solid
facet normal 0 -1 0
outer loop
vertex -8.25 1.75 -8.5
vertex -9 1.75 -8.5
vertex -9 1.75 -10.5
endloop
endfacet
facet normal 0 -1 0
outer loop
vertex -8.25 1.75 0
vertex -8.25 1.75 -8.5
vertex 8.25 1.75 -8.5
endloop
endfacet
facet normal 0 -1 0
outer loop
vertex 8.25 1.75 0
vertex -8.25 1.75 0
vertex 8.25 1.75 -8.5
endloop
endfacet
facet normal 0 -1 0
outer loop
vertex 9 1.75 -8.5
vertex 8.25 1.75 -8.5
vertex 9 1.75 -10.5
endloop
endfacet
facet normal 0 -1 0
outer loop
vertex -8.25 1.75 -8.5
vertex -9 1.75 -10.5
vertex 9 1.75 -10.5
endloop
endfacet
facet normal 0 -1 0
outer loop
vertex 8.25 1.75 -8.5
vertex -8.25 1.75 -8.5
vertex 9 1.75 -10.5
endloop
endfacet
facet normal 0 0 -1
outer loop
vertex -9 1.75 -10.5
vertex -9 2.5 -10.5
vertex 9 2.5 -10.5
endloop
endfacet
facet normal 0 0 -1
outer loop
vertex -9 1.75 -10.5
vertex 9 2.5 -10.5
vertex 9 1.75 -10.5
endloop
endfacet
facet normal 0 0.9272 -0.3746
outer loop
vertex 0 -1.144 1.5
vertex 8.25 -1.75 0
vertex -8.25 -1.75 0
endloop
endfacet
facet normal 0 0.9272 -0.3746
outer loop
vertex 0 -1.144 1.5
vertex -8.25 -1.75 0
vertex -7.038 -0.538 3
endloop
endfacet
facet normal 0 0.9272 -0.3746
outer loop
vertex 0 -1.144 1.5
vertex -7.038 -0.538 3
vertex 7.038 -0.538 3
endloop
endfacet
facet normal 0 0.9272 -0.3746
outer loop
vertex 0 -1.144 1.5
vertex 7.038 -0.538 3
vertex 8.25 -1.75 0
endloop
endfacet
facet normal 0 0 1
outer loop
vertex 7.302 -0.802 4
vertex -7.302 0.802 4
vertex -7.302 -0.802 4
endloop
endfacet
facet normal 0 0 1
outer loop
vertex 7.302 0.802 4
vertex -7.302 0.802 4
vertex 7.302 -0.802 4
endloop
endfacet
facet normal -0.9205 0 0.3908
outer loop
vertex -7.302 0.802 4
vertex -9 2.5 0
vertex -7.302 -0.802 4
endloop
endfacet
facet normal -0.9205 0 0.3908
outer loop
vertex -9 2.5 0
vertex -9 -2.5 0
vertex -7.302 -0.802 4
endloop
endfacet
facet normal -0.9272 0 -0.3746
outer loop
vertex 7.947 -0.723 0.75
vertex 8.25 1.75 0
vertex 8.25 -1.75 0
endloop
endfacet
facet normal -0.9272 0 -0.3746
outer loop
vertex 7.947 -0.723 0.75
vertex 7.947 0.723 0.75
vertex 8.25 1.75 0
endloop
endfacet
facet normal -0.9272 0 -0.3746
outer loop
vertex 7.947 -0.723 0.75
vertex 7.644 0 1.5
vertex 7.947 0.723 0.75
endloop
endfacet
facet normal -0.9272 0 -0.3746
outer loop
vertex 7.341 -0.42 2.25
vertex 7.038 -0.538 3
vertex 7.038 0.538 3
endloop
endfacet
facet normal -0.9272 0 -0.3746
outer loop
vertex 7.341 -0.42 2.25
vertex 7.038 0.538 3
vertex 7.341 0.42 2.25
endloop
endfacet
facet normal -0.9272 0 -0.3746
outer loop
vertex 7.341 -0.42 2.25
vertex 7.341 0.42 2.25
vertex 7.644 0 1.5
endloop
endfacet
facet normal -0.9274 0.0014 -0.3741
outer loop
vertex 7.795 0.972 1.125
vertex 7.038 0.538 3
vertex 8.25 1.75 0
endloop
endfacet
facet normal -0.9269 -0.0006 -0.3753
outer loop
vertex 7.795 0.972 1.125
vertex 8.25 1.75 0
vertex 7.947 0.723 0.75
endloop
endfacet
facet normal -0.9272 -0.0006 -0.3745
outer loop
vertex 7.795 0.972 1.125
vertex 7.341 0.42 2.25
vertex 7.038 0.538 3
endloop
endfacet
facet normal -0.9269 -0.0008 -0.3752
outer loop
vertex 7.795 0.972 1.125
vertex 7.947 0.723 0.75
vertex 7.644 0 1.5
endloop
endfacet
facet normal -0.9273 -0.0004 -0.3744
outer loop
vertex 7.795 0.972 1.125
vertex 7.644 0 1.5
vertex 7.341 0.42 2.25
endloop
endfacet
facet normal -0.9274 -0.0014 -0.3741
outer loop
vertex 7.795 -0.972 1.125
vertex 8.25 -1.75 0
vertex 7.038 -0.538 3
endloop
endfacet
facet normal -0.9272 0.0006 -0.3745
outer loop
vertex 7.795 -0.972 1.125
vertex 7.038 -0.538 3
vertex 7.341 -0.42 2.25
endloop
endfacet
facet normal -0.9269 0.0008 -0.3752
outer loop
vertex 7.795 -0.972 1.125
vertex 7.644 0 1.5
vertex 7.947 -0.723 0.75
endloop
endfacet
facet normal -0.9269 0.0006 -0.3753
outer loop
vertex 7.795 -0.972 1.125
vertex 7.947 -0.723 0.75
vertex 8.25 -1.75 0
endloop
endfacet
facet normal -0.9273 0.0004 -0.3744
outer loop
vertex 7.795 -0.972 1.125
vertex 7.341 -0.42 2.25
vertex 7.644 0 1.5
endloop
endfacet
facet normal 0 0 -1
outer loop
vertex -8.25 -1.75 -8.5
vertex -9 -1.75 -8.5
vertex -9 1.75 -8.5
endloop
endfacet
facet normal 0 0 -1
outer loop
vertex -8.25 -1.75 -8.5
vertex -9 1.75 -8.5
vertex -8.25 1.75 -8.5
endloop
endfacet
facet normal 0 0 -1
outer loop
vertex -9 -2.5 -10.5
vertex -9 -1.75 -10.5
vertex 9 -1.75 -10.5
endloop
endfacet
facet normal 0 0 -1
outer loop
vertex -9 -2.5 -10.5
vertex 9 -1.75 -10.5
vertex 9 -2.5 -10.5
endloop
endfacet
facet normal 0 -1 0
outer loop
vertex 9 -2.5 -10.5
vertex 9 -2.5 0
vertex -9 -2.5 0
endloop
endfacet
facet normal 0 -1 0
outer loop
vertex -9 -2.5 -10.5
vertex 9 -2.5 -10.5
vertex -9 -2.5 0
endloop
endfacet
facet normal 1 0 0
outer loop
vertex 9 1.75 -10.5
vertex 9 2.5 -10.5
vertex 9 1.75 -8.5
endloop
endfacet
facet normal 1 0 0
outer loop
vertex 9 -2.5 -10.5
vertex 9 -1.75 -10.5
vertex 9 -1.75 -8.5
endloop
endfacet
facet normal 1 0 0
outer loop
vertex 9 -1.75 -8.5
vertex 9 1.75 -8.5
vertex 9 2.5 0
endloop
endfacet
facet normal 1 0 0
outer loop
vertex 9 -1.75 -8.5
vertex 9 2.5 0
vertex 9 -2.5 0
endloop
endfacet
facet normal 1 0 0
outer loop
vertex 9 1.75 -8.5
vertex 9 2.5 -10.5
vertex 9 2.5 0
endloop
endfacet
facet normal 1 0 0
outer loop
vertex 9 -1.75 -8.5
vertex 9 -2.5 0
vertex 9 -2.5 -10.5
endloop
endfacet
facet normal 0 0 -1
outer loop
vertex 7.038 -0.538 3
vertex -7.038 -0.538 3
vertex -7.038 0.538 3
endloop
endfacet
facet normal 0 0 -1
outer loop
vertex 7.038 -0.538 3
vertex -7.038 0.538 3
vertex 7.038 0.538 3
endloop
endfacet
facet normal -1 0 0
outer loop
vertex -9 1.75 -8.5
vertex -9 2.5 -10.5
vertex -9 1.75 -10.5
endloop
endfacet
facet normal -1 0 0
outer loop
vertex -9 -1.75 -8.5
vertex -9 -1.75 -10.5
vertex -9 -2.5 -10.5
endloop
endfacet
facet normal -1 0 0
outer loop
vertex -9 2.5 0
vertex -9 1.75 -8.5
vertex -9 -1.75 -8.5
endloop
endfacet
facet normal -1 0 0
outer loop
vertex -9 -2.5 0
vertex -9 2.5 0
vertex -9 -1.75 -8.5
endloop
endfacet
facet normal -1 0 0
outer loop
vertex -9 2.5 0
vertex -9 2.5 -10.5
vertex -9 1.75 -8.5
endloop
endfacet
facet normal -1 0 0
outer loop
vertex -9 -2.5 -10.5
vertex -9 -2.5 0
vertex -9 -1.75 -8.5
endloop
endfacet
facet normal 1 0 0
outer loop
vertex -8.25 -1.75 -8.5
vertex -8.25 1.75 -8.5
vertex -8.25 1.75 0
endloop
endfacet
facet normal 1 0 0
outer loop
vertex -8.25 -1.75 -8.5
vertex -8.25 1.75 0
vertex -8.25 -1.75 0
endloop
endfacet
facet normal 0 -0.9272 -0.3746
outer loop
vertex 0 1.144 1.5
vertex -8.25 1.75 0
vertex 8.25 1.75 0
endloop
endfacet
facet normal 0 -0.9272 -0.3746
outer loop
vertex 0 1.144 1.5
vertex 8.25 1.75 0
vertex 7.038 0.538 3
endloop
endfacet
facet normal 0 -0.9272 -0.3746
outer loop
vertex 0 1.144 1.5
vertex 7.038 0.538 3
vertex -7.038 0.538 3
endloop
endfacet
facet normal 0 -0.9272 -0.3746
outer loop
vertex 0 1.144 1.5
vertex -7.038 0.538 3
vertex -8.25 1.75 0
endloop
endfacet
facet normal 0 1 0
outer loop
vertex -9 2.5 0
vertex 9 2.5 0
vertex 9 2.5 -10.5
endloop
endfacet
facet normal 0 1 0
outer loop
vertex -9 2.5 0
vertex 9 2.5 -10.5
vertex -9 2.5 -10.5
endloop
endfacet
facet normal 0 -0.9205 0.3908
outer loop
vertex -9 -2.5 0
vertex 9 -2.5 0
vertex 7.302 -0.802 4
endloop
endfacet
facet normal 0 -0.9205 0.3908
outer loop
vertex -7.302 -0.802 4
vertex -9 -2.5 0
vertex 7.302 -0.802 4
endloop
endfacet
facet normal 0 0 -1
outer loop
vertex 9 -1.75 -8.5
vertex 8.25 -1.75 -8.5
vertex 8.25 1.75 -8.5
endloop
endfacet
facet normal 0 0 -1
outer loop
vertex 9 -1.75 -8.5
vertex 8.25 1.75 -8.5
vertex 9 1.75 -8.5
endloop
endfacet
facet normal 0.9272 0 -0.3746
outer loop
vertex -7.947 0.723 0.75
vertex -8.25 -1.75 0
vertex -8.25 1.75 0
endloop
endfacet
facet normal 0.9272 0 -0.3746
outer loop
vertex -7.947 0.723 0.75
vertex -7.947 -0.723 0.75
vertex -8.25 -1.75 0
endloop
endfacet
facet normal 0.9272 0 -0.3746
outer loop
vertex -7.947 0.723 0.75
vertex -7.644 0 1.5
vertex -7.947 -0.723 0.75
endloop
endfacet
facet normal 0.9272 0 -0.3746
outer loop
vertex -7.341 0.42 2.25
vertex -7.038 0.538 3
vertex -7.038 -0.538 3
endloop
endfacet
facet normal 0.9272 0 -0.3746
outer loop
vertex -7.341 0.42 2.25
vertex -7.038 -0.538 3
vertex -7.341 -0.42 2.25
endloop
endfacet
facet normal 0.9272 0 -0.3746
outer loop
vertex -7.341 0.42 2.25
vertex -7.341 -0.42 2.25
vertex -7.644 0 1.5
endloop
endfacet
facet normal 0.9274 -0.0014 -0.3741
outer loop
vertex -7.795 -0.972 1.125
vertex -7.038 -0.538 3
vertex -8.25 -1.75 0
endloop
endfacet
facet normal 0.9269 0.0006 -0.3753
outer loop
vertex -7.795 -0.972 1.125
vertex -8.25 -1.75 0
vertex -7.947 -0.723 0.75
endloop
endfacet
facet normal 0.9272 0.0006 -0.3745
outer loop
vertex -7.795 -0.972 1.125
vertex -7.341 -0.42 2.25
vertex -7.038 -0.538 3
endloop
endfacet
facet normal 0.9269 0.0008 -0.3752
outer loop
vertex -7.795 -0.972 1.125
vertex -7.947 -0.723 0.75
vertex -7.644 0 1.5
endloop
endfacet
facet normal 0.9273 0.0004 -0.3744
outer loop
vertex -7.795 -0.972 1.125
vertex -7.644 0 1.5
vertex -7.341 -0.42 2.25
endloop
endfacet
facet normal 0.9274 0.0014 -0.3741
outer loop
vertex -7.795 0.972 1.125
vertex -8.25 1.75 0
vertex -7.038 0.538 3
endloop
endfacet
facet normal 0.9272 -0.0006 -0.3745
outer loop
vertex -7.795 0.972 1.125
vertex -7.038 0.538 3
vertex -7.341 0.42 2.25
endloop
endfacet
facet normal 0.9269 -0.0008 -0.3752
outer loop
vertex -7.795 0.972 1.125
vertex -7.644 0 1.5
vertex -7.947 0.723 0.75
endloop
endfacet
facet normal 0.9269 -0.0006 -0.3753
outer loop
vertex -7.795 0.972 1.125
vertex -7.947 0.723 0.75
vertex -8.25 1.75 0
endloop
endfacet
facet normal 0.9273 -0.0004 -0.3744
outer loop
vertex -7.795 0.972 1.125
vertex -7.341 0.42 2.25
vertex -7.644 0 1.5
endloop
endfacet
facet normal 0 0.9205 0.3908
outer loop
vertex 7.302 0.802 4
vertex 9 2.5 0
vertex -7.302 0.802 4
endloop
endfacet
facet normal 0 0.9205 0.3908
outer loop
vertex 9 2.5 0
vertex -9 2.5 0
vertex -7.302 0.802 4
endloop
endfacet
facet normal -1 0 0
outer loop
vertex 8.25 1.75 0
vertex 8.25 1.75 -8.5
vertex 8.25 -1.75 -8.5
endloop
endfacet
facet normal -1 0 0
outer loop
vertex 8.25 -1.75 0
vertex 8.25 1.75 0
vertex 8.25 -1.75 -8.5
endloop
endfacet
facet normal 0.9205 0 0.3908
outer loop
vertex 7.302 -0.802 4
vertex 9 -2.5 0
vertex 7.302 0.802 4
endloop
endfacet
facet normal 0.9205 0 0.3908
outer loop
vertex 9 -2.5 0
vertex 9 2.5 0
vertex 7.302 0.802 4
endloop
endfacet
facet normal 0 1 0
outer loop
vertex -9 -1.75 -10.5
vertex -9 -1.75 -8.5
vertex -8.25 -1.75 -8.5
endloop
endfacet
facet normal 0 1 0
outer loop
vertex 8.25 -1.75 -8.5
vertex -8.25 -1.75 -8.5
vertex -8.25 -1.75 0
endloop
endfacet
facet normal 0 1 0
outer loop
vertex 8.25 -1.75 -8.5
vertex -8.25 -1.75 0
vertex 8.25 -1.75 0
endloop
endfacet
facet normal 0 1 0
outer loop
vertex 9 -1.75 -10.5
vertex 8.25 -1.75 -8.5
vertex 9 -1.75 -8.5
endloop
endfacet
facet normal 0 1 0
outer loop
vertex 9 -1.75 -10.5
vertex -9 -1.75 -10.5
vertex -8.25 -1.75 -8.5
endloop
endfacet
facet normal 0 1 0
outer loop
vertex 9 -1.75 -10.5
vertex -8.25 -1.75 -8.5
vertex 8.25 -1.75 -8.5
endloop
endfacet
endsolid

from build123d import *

# Parameters (mm, degrees)
SKETCH_W        = 18
SKETCH_H        = 5
PAD_DEPTH       = 4
PAD_TAPER       = 23
PAD_FACE5_W     = 5
PAD_FACE5_H     = 18
PAD001_DEPTH    = 10.5
SKETCH001_W     = 16.5
SKETCH001_H     = 3.5
POCKET_DEPTH    = 10.5
SKETCH002_W     = 16.5
SKETCH002_H     = 3.5
POCKET001_DEPTH = 3
POCKET001_TAPER = 22
SKETCH003_W     = 18.711727
SKETCH003_H     = 3.5
POCKET002_DEPTH = 2


with BuildPart() as part:
    # Sketch → Pad (new body)
    with BuildSketch(Plane.XY):
        Rectangle(SKETCH_W, SKETCH_H)
    extrude(amount=PAD_DEPTH, taper=PAD_TAPER)

    # Pad Face5 → Pad001 (add)
    with BuildSketch(Plane(origin=(0, 0, 0), x_dir=(0, -1, 0), z_dir=(0, 0, -1))):
        Rectangle(PAD_FACE5_W, PAD_FACE5_H)
    extrude(amount=PAD001_DEPTH)

    # Sketch001 (on Face8 of Pad001) → Pocket (cut)
    with BuildSketch(Plane(origin=(0, 0, -10.5), x_dir=(1, 0, 0), z_dir=(0, 0, -1))):
        Rectangle(SKETCH001_W, SKETCH001_H)
    extrude(amount=-POCKET_DEPTH, mode=Mode.SUBTRACT)

    # Sketch002 (on Face15 of Pocket) → Pocket001 (cut)
    with BuildSketch(Plane(origin=(0, 0, 0), x_dir=(1, 0, 0), z_dir=(0, 0, -1))):
        Rectangle(SKETCH002_W, SKETCH002_H)
    extrude(amount=-POCKET001_DEPTH, taper=POCKET001_TAPER, mode=Mode.SUBTRACT)

    # Sketch003 (on Face8 of Pocket001) → Pocket002 (cut)
    with BuildSketch(Plane(origin=(0, 0, -10.5), x_dir=(1, 0, 0), z_dir=(0, 0, -1))):
        with Locations((0.078186, 0)):
            Rectangle(SKETCH003_W, SKETCH003_H)
    extrude(amount=-POCKET002_DEPTH, mode=Mode.SUBTRACT)


solid = part.part
